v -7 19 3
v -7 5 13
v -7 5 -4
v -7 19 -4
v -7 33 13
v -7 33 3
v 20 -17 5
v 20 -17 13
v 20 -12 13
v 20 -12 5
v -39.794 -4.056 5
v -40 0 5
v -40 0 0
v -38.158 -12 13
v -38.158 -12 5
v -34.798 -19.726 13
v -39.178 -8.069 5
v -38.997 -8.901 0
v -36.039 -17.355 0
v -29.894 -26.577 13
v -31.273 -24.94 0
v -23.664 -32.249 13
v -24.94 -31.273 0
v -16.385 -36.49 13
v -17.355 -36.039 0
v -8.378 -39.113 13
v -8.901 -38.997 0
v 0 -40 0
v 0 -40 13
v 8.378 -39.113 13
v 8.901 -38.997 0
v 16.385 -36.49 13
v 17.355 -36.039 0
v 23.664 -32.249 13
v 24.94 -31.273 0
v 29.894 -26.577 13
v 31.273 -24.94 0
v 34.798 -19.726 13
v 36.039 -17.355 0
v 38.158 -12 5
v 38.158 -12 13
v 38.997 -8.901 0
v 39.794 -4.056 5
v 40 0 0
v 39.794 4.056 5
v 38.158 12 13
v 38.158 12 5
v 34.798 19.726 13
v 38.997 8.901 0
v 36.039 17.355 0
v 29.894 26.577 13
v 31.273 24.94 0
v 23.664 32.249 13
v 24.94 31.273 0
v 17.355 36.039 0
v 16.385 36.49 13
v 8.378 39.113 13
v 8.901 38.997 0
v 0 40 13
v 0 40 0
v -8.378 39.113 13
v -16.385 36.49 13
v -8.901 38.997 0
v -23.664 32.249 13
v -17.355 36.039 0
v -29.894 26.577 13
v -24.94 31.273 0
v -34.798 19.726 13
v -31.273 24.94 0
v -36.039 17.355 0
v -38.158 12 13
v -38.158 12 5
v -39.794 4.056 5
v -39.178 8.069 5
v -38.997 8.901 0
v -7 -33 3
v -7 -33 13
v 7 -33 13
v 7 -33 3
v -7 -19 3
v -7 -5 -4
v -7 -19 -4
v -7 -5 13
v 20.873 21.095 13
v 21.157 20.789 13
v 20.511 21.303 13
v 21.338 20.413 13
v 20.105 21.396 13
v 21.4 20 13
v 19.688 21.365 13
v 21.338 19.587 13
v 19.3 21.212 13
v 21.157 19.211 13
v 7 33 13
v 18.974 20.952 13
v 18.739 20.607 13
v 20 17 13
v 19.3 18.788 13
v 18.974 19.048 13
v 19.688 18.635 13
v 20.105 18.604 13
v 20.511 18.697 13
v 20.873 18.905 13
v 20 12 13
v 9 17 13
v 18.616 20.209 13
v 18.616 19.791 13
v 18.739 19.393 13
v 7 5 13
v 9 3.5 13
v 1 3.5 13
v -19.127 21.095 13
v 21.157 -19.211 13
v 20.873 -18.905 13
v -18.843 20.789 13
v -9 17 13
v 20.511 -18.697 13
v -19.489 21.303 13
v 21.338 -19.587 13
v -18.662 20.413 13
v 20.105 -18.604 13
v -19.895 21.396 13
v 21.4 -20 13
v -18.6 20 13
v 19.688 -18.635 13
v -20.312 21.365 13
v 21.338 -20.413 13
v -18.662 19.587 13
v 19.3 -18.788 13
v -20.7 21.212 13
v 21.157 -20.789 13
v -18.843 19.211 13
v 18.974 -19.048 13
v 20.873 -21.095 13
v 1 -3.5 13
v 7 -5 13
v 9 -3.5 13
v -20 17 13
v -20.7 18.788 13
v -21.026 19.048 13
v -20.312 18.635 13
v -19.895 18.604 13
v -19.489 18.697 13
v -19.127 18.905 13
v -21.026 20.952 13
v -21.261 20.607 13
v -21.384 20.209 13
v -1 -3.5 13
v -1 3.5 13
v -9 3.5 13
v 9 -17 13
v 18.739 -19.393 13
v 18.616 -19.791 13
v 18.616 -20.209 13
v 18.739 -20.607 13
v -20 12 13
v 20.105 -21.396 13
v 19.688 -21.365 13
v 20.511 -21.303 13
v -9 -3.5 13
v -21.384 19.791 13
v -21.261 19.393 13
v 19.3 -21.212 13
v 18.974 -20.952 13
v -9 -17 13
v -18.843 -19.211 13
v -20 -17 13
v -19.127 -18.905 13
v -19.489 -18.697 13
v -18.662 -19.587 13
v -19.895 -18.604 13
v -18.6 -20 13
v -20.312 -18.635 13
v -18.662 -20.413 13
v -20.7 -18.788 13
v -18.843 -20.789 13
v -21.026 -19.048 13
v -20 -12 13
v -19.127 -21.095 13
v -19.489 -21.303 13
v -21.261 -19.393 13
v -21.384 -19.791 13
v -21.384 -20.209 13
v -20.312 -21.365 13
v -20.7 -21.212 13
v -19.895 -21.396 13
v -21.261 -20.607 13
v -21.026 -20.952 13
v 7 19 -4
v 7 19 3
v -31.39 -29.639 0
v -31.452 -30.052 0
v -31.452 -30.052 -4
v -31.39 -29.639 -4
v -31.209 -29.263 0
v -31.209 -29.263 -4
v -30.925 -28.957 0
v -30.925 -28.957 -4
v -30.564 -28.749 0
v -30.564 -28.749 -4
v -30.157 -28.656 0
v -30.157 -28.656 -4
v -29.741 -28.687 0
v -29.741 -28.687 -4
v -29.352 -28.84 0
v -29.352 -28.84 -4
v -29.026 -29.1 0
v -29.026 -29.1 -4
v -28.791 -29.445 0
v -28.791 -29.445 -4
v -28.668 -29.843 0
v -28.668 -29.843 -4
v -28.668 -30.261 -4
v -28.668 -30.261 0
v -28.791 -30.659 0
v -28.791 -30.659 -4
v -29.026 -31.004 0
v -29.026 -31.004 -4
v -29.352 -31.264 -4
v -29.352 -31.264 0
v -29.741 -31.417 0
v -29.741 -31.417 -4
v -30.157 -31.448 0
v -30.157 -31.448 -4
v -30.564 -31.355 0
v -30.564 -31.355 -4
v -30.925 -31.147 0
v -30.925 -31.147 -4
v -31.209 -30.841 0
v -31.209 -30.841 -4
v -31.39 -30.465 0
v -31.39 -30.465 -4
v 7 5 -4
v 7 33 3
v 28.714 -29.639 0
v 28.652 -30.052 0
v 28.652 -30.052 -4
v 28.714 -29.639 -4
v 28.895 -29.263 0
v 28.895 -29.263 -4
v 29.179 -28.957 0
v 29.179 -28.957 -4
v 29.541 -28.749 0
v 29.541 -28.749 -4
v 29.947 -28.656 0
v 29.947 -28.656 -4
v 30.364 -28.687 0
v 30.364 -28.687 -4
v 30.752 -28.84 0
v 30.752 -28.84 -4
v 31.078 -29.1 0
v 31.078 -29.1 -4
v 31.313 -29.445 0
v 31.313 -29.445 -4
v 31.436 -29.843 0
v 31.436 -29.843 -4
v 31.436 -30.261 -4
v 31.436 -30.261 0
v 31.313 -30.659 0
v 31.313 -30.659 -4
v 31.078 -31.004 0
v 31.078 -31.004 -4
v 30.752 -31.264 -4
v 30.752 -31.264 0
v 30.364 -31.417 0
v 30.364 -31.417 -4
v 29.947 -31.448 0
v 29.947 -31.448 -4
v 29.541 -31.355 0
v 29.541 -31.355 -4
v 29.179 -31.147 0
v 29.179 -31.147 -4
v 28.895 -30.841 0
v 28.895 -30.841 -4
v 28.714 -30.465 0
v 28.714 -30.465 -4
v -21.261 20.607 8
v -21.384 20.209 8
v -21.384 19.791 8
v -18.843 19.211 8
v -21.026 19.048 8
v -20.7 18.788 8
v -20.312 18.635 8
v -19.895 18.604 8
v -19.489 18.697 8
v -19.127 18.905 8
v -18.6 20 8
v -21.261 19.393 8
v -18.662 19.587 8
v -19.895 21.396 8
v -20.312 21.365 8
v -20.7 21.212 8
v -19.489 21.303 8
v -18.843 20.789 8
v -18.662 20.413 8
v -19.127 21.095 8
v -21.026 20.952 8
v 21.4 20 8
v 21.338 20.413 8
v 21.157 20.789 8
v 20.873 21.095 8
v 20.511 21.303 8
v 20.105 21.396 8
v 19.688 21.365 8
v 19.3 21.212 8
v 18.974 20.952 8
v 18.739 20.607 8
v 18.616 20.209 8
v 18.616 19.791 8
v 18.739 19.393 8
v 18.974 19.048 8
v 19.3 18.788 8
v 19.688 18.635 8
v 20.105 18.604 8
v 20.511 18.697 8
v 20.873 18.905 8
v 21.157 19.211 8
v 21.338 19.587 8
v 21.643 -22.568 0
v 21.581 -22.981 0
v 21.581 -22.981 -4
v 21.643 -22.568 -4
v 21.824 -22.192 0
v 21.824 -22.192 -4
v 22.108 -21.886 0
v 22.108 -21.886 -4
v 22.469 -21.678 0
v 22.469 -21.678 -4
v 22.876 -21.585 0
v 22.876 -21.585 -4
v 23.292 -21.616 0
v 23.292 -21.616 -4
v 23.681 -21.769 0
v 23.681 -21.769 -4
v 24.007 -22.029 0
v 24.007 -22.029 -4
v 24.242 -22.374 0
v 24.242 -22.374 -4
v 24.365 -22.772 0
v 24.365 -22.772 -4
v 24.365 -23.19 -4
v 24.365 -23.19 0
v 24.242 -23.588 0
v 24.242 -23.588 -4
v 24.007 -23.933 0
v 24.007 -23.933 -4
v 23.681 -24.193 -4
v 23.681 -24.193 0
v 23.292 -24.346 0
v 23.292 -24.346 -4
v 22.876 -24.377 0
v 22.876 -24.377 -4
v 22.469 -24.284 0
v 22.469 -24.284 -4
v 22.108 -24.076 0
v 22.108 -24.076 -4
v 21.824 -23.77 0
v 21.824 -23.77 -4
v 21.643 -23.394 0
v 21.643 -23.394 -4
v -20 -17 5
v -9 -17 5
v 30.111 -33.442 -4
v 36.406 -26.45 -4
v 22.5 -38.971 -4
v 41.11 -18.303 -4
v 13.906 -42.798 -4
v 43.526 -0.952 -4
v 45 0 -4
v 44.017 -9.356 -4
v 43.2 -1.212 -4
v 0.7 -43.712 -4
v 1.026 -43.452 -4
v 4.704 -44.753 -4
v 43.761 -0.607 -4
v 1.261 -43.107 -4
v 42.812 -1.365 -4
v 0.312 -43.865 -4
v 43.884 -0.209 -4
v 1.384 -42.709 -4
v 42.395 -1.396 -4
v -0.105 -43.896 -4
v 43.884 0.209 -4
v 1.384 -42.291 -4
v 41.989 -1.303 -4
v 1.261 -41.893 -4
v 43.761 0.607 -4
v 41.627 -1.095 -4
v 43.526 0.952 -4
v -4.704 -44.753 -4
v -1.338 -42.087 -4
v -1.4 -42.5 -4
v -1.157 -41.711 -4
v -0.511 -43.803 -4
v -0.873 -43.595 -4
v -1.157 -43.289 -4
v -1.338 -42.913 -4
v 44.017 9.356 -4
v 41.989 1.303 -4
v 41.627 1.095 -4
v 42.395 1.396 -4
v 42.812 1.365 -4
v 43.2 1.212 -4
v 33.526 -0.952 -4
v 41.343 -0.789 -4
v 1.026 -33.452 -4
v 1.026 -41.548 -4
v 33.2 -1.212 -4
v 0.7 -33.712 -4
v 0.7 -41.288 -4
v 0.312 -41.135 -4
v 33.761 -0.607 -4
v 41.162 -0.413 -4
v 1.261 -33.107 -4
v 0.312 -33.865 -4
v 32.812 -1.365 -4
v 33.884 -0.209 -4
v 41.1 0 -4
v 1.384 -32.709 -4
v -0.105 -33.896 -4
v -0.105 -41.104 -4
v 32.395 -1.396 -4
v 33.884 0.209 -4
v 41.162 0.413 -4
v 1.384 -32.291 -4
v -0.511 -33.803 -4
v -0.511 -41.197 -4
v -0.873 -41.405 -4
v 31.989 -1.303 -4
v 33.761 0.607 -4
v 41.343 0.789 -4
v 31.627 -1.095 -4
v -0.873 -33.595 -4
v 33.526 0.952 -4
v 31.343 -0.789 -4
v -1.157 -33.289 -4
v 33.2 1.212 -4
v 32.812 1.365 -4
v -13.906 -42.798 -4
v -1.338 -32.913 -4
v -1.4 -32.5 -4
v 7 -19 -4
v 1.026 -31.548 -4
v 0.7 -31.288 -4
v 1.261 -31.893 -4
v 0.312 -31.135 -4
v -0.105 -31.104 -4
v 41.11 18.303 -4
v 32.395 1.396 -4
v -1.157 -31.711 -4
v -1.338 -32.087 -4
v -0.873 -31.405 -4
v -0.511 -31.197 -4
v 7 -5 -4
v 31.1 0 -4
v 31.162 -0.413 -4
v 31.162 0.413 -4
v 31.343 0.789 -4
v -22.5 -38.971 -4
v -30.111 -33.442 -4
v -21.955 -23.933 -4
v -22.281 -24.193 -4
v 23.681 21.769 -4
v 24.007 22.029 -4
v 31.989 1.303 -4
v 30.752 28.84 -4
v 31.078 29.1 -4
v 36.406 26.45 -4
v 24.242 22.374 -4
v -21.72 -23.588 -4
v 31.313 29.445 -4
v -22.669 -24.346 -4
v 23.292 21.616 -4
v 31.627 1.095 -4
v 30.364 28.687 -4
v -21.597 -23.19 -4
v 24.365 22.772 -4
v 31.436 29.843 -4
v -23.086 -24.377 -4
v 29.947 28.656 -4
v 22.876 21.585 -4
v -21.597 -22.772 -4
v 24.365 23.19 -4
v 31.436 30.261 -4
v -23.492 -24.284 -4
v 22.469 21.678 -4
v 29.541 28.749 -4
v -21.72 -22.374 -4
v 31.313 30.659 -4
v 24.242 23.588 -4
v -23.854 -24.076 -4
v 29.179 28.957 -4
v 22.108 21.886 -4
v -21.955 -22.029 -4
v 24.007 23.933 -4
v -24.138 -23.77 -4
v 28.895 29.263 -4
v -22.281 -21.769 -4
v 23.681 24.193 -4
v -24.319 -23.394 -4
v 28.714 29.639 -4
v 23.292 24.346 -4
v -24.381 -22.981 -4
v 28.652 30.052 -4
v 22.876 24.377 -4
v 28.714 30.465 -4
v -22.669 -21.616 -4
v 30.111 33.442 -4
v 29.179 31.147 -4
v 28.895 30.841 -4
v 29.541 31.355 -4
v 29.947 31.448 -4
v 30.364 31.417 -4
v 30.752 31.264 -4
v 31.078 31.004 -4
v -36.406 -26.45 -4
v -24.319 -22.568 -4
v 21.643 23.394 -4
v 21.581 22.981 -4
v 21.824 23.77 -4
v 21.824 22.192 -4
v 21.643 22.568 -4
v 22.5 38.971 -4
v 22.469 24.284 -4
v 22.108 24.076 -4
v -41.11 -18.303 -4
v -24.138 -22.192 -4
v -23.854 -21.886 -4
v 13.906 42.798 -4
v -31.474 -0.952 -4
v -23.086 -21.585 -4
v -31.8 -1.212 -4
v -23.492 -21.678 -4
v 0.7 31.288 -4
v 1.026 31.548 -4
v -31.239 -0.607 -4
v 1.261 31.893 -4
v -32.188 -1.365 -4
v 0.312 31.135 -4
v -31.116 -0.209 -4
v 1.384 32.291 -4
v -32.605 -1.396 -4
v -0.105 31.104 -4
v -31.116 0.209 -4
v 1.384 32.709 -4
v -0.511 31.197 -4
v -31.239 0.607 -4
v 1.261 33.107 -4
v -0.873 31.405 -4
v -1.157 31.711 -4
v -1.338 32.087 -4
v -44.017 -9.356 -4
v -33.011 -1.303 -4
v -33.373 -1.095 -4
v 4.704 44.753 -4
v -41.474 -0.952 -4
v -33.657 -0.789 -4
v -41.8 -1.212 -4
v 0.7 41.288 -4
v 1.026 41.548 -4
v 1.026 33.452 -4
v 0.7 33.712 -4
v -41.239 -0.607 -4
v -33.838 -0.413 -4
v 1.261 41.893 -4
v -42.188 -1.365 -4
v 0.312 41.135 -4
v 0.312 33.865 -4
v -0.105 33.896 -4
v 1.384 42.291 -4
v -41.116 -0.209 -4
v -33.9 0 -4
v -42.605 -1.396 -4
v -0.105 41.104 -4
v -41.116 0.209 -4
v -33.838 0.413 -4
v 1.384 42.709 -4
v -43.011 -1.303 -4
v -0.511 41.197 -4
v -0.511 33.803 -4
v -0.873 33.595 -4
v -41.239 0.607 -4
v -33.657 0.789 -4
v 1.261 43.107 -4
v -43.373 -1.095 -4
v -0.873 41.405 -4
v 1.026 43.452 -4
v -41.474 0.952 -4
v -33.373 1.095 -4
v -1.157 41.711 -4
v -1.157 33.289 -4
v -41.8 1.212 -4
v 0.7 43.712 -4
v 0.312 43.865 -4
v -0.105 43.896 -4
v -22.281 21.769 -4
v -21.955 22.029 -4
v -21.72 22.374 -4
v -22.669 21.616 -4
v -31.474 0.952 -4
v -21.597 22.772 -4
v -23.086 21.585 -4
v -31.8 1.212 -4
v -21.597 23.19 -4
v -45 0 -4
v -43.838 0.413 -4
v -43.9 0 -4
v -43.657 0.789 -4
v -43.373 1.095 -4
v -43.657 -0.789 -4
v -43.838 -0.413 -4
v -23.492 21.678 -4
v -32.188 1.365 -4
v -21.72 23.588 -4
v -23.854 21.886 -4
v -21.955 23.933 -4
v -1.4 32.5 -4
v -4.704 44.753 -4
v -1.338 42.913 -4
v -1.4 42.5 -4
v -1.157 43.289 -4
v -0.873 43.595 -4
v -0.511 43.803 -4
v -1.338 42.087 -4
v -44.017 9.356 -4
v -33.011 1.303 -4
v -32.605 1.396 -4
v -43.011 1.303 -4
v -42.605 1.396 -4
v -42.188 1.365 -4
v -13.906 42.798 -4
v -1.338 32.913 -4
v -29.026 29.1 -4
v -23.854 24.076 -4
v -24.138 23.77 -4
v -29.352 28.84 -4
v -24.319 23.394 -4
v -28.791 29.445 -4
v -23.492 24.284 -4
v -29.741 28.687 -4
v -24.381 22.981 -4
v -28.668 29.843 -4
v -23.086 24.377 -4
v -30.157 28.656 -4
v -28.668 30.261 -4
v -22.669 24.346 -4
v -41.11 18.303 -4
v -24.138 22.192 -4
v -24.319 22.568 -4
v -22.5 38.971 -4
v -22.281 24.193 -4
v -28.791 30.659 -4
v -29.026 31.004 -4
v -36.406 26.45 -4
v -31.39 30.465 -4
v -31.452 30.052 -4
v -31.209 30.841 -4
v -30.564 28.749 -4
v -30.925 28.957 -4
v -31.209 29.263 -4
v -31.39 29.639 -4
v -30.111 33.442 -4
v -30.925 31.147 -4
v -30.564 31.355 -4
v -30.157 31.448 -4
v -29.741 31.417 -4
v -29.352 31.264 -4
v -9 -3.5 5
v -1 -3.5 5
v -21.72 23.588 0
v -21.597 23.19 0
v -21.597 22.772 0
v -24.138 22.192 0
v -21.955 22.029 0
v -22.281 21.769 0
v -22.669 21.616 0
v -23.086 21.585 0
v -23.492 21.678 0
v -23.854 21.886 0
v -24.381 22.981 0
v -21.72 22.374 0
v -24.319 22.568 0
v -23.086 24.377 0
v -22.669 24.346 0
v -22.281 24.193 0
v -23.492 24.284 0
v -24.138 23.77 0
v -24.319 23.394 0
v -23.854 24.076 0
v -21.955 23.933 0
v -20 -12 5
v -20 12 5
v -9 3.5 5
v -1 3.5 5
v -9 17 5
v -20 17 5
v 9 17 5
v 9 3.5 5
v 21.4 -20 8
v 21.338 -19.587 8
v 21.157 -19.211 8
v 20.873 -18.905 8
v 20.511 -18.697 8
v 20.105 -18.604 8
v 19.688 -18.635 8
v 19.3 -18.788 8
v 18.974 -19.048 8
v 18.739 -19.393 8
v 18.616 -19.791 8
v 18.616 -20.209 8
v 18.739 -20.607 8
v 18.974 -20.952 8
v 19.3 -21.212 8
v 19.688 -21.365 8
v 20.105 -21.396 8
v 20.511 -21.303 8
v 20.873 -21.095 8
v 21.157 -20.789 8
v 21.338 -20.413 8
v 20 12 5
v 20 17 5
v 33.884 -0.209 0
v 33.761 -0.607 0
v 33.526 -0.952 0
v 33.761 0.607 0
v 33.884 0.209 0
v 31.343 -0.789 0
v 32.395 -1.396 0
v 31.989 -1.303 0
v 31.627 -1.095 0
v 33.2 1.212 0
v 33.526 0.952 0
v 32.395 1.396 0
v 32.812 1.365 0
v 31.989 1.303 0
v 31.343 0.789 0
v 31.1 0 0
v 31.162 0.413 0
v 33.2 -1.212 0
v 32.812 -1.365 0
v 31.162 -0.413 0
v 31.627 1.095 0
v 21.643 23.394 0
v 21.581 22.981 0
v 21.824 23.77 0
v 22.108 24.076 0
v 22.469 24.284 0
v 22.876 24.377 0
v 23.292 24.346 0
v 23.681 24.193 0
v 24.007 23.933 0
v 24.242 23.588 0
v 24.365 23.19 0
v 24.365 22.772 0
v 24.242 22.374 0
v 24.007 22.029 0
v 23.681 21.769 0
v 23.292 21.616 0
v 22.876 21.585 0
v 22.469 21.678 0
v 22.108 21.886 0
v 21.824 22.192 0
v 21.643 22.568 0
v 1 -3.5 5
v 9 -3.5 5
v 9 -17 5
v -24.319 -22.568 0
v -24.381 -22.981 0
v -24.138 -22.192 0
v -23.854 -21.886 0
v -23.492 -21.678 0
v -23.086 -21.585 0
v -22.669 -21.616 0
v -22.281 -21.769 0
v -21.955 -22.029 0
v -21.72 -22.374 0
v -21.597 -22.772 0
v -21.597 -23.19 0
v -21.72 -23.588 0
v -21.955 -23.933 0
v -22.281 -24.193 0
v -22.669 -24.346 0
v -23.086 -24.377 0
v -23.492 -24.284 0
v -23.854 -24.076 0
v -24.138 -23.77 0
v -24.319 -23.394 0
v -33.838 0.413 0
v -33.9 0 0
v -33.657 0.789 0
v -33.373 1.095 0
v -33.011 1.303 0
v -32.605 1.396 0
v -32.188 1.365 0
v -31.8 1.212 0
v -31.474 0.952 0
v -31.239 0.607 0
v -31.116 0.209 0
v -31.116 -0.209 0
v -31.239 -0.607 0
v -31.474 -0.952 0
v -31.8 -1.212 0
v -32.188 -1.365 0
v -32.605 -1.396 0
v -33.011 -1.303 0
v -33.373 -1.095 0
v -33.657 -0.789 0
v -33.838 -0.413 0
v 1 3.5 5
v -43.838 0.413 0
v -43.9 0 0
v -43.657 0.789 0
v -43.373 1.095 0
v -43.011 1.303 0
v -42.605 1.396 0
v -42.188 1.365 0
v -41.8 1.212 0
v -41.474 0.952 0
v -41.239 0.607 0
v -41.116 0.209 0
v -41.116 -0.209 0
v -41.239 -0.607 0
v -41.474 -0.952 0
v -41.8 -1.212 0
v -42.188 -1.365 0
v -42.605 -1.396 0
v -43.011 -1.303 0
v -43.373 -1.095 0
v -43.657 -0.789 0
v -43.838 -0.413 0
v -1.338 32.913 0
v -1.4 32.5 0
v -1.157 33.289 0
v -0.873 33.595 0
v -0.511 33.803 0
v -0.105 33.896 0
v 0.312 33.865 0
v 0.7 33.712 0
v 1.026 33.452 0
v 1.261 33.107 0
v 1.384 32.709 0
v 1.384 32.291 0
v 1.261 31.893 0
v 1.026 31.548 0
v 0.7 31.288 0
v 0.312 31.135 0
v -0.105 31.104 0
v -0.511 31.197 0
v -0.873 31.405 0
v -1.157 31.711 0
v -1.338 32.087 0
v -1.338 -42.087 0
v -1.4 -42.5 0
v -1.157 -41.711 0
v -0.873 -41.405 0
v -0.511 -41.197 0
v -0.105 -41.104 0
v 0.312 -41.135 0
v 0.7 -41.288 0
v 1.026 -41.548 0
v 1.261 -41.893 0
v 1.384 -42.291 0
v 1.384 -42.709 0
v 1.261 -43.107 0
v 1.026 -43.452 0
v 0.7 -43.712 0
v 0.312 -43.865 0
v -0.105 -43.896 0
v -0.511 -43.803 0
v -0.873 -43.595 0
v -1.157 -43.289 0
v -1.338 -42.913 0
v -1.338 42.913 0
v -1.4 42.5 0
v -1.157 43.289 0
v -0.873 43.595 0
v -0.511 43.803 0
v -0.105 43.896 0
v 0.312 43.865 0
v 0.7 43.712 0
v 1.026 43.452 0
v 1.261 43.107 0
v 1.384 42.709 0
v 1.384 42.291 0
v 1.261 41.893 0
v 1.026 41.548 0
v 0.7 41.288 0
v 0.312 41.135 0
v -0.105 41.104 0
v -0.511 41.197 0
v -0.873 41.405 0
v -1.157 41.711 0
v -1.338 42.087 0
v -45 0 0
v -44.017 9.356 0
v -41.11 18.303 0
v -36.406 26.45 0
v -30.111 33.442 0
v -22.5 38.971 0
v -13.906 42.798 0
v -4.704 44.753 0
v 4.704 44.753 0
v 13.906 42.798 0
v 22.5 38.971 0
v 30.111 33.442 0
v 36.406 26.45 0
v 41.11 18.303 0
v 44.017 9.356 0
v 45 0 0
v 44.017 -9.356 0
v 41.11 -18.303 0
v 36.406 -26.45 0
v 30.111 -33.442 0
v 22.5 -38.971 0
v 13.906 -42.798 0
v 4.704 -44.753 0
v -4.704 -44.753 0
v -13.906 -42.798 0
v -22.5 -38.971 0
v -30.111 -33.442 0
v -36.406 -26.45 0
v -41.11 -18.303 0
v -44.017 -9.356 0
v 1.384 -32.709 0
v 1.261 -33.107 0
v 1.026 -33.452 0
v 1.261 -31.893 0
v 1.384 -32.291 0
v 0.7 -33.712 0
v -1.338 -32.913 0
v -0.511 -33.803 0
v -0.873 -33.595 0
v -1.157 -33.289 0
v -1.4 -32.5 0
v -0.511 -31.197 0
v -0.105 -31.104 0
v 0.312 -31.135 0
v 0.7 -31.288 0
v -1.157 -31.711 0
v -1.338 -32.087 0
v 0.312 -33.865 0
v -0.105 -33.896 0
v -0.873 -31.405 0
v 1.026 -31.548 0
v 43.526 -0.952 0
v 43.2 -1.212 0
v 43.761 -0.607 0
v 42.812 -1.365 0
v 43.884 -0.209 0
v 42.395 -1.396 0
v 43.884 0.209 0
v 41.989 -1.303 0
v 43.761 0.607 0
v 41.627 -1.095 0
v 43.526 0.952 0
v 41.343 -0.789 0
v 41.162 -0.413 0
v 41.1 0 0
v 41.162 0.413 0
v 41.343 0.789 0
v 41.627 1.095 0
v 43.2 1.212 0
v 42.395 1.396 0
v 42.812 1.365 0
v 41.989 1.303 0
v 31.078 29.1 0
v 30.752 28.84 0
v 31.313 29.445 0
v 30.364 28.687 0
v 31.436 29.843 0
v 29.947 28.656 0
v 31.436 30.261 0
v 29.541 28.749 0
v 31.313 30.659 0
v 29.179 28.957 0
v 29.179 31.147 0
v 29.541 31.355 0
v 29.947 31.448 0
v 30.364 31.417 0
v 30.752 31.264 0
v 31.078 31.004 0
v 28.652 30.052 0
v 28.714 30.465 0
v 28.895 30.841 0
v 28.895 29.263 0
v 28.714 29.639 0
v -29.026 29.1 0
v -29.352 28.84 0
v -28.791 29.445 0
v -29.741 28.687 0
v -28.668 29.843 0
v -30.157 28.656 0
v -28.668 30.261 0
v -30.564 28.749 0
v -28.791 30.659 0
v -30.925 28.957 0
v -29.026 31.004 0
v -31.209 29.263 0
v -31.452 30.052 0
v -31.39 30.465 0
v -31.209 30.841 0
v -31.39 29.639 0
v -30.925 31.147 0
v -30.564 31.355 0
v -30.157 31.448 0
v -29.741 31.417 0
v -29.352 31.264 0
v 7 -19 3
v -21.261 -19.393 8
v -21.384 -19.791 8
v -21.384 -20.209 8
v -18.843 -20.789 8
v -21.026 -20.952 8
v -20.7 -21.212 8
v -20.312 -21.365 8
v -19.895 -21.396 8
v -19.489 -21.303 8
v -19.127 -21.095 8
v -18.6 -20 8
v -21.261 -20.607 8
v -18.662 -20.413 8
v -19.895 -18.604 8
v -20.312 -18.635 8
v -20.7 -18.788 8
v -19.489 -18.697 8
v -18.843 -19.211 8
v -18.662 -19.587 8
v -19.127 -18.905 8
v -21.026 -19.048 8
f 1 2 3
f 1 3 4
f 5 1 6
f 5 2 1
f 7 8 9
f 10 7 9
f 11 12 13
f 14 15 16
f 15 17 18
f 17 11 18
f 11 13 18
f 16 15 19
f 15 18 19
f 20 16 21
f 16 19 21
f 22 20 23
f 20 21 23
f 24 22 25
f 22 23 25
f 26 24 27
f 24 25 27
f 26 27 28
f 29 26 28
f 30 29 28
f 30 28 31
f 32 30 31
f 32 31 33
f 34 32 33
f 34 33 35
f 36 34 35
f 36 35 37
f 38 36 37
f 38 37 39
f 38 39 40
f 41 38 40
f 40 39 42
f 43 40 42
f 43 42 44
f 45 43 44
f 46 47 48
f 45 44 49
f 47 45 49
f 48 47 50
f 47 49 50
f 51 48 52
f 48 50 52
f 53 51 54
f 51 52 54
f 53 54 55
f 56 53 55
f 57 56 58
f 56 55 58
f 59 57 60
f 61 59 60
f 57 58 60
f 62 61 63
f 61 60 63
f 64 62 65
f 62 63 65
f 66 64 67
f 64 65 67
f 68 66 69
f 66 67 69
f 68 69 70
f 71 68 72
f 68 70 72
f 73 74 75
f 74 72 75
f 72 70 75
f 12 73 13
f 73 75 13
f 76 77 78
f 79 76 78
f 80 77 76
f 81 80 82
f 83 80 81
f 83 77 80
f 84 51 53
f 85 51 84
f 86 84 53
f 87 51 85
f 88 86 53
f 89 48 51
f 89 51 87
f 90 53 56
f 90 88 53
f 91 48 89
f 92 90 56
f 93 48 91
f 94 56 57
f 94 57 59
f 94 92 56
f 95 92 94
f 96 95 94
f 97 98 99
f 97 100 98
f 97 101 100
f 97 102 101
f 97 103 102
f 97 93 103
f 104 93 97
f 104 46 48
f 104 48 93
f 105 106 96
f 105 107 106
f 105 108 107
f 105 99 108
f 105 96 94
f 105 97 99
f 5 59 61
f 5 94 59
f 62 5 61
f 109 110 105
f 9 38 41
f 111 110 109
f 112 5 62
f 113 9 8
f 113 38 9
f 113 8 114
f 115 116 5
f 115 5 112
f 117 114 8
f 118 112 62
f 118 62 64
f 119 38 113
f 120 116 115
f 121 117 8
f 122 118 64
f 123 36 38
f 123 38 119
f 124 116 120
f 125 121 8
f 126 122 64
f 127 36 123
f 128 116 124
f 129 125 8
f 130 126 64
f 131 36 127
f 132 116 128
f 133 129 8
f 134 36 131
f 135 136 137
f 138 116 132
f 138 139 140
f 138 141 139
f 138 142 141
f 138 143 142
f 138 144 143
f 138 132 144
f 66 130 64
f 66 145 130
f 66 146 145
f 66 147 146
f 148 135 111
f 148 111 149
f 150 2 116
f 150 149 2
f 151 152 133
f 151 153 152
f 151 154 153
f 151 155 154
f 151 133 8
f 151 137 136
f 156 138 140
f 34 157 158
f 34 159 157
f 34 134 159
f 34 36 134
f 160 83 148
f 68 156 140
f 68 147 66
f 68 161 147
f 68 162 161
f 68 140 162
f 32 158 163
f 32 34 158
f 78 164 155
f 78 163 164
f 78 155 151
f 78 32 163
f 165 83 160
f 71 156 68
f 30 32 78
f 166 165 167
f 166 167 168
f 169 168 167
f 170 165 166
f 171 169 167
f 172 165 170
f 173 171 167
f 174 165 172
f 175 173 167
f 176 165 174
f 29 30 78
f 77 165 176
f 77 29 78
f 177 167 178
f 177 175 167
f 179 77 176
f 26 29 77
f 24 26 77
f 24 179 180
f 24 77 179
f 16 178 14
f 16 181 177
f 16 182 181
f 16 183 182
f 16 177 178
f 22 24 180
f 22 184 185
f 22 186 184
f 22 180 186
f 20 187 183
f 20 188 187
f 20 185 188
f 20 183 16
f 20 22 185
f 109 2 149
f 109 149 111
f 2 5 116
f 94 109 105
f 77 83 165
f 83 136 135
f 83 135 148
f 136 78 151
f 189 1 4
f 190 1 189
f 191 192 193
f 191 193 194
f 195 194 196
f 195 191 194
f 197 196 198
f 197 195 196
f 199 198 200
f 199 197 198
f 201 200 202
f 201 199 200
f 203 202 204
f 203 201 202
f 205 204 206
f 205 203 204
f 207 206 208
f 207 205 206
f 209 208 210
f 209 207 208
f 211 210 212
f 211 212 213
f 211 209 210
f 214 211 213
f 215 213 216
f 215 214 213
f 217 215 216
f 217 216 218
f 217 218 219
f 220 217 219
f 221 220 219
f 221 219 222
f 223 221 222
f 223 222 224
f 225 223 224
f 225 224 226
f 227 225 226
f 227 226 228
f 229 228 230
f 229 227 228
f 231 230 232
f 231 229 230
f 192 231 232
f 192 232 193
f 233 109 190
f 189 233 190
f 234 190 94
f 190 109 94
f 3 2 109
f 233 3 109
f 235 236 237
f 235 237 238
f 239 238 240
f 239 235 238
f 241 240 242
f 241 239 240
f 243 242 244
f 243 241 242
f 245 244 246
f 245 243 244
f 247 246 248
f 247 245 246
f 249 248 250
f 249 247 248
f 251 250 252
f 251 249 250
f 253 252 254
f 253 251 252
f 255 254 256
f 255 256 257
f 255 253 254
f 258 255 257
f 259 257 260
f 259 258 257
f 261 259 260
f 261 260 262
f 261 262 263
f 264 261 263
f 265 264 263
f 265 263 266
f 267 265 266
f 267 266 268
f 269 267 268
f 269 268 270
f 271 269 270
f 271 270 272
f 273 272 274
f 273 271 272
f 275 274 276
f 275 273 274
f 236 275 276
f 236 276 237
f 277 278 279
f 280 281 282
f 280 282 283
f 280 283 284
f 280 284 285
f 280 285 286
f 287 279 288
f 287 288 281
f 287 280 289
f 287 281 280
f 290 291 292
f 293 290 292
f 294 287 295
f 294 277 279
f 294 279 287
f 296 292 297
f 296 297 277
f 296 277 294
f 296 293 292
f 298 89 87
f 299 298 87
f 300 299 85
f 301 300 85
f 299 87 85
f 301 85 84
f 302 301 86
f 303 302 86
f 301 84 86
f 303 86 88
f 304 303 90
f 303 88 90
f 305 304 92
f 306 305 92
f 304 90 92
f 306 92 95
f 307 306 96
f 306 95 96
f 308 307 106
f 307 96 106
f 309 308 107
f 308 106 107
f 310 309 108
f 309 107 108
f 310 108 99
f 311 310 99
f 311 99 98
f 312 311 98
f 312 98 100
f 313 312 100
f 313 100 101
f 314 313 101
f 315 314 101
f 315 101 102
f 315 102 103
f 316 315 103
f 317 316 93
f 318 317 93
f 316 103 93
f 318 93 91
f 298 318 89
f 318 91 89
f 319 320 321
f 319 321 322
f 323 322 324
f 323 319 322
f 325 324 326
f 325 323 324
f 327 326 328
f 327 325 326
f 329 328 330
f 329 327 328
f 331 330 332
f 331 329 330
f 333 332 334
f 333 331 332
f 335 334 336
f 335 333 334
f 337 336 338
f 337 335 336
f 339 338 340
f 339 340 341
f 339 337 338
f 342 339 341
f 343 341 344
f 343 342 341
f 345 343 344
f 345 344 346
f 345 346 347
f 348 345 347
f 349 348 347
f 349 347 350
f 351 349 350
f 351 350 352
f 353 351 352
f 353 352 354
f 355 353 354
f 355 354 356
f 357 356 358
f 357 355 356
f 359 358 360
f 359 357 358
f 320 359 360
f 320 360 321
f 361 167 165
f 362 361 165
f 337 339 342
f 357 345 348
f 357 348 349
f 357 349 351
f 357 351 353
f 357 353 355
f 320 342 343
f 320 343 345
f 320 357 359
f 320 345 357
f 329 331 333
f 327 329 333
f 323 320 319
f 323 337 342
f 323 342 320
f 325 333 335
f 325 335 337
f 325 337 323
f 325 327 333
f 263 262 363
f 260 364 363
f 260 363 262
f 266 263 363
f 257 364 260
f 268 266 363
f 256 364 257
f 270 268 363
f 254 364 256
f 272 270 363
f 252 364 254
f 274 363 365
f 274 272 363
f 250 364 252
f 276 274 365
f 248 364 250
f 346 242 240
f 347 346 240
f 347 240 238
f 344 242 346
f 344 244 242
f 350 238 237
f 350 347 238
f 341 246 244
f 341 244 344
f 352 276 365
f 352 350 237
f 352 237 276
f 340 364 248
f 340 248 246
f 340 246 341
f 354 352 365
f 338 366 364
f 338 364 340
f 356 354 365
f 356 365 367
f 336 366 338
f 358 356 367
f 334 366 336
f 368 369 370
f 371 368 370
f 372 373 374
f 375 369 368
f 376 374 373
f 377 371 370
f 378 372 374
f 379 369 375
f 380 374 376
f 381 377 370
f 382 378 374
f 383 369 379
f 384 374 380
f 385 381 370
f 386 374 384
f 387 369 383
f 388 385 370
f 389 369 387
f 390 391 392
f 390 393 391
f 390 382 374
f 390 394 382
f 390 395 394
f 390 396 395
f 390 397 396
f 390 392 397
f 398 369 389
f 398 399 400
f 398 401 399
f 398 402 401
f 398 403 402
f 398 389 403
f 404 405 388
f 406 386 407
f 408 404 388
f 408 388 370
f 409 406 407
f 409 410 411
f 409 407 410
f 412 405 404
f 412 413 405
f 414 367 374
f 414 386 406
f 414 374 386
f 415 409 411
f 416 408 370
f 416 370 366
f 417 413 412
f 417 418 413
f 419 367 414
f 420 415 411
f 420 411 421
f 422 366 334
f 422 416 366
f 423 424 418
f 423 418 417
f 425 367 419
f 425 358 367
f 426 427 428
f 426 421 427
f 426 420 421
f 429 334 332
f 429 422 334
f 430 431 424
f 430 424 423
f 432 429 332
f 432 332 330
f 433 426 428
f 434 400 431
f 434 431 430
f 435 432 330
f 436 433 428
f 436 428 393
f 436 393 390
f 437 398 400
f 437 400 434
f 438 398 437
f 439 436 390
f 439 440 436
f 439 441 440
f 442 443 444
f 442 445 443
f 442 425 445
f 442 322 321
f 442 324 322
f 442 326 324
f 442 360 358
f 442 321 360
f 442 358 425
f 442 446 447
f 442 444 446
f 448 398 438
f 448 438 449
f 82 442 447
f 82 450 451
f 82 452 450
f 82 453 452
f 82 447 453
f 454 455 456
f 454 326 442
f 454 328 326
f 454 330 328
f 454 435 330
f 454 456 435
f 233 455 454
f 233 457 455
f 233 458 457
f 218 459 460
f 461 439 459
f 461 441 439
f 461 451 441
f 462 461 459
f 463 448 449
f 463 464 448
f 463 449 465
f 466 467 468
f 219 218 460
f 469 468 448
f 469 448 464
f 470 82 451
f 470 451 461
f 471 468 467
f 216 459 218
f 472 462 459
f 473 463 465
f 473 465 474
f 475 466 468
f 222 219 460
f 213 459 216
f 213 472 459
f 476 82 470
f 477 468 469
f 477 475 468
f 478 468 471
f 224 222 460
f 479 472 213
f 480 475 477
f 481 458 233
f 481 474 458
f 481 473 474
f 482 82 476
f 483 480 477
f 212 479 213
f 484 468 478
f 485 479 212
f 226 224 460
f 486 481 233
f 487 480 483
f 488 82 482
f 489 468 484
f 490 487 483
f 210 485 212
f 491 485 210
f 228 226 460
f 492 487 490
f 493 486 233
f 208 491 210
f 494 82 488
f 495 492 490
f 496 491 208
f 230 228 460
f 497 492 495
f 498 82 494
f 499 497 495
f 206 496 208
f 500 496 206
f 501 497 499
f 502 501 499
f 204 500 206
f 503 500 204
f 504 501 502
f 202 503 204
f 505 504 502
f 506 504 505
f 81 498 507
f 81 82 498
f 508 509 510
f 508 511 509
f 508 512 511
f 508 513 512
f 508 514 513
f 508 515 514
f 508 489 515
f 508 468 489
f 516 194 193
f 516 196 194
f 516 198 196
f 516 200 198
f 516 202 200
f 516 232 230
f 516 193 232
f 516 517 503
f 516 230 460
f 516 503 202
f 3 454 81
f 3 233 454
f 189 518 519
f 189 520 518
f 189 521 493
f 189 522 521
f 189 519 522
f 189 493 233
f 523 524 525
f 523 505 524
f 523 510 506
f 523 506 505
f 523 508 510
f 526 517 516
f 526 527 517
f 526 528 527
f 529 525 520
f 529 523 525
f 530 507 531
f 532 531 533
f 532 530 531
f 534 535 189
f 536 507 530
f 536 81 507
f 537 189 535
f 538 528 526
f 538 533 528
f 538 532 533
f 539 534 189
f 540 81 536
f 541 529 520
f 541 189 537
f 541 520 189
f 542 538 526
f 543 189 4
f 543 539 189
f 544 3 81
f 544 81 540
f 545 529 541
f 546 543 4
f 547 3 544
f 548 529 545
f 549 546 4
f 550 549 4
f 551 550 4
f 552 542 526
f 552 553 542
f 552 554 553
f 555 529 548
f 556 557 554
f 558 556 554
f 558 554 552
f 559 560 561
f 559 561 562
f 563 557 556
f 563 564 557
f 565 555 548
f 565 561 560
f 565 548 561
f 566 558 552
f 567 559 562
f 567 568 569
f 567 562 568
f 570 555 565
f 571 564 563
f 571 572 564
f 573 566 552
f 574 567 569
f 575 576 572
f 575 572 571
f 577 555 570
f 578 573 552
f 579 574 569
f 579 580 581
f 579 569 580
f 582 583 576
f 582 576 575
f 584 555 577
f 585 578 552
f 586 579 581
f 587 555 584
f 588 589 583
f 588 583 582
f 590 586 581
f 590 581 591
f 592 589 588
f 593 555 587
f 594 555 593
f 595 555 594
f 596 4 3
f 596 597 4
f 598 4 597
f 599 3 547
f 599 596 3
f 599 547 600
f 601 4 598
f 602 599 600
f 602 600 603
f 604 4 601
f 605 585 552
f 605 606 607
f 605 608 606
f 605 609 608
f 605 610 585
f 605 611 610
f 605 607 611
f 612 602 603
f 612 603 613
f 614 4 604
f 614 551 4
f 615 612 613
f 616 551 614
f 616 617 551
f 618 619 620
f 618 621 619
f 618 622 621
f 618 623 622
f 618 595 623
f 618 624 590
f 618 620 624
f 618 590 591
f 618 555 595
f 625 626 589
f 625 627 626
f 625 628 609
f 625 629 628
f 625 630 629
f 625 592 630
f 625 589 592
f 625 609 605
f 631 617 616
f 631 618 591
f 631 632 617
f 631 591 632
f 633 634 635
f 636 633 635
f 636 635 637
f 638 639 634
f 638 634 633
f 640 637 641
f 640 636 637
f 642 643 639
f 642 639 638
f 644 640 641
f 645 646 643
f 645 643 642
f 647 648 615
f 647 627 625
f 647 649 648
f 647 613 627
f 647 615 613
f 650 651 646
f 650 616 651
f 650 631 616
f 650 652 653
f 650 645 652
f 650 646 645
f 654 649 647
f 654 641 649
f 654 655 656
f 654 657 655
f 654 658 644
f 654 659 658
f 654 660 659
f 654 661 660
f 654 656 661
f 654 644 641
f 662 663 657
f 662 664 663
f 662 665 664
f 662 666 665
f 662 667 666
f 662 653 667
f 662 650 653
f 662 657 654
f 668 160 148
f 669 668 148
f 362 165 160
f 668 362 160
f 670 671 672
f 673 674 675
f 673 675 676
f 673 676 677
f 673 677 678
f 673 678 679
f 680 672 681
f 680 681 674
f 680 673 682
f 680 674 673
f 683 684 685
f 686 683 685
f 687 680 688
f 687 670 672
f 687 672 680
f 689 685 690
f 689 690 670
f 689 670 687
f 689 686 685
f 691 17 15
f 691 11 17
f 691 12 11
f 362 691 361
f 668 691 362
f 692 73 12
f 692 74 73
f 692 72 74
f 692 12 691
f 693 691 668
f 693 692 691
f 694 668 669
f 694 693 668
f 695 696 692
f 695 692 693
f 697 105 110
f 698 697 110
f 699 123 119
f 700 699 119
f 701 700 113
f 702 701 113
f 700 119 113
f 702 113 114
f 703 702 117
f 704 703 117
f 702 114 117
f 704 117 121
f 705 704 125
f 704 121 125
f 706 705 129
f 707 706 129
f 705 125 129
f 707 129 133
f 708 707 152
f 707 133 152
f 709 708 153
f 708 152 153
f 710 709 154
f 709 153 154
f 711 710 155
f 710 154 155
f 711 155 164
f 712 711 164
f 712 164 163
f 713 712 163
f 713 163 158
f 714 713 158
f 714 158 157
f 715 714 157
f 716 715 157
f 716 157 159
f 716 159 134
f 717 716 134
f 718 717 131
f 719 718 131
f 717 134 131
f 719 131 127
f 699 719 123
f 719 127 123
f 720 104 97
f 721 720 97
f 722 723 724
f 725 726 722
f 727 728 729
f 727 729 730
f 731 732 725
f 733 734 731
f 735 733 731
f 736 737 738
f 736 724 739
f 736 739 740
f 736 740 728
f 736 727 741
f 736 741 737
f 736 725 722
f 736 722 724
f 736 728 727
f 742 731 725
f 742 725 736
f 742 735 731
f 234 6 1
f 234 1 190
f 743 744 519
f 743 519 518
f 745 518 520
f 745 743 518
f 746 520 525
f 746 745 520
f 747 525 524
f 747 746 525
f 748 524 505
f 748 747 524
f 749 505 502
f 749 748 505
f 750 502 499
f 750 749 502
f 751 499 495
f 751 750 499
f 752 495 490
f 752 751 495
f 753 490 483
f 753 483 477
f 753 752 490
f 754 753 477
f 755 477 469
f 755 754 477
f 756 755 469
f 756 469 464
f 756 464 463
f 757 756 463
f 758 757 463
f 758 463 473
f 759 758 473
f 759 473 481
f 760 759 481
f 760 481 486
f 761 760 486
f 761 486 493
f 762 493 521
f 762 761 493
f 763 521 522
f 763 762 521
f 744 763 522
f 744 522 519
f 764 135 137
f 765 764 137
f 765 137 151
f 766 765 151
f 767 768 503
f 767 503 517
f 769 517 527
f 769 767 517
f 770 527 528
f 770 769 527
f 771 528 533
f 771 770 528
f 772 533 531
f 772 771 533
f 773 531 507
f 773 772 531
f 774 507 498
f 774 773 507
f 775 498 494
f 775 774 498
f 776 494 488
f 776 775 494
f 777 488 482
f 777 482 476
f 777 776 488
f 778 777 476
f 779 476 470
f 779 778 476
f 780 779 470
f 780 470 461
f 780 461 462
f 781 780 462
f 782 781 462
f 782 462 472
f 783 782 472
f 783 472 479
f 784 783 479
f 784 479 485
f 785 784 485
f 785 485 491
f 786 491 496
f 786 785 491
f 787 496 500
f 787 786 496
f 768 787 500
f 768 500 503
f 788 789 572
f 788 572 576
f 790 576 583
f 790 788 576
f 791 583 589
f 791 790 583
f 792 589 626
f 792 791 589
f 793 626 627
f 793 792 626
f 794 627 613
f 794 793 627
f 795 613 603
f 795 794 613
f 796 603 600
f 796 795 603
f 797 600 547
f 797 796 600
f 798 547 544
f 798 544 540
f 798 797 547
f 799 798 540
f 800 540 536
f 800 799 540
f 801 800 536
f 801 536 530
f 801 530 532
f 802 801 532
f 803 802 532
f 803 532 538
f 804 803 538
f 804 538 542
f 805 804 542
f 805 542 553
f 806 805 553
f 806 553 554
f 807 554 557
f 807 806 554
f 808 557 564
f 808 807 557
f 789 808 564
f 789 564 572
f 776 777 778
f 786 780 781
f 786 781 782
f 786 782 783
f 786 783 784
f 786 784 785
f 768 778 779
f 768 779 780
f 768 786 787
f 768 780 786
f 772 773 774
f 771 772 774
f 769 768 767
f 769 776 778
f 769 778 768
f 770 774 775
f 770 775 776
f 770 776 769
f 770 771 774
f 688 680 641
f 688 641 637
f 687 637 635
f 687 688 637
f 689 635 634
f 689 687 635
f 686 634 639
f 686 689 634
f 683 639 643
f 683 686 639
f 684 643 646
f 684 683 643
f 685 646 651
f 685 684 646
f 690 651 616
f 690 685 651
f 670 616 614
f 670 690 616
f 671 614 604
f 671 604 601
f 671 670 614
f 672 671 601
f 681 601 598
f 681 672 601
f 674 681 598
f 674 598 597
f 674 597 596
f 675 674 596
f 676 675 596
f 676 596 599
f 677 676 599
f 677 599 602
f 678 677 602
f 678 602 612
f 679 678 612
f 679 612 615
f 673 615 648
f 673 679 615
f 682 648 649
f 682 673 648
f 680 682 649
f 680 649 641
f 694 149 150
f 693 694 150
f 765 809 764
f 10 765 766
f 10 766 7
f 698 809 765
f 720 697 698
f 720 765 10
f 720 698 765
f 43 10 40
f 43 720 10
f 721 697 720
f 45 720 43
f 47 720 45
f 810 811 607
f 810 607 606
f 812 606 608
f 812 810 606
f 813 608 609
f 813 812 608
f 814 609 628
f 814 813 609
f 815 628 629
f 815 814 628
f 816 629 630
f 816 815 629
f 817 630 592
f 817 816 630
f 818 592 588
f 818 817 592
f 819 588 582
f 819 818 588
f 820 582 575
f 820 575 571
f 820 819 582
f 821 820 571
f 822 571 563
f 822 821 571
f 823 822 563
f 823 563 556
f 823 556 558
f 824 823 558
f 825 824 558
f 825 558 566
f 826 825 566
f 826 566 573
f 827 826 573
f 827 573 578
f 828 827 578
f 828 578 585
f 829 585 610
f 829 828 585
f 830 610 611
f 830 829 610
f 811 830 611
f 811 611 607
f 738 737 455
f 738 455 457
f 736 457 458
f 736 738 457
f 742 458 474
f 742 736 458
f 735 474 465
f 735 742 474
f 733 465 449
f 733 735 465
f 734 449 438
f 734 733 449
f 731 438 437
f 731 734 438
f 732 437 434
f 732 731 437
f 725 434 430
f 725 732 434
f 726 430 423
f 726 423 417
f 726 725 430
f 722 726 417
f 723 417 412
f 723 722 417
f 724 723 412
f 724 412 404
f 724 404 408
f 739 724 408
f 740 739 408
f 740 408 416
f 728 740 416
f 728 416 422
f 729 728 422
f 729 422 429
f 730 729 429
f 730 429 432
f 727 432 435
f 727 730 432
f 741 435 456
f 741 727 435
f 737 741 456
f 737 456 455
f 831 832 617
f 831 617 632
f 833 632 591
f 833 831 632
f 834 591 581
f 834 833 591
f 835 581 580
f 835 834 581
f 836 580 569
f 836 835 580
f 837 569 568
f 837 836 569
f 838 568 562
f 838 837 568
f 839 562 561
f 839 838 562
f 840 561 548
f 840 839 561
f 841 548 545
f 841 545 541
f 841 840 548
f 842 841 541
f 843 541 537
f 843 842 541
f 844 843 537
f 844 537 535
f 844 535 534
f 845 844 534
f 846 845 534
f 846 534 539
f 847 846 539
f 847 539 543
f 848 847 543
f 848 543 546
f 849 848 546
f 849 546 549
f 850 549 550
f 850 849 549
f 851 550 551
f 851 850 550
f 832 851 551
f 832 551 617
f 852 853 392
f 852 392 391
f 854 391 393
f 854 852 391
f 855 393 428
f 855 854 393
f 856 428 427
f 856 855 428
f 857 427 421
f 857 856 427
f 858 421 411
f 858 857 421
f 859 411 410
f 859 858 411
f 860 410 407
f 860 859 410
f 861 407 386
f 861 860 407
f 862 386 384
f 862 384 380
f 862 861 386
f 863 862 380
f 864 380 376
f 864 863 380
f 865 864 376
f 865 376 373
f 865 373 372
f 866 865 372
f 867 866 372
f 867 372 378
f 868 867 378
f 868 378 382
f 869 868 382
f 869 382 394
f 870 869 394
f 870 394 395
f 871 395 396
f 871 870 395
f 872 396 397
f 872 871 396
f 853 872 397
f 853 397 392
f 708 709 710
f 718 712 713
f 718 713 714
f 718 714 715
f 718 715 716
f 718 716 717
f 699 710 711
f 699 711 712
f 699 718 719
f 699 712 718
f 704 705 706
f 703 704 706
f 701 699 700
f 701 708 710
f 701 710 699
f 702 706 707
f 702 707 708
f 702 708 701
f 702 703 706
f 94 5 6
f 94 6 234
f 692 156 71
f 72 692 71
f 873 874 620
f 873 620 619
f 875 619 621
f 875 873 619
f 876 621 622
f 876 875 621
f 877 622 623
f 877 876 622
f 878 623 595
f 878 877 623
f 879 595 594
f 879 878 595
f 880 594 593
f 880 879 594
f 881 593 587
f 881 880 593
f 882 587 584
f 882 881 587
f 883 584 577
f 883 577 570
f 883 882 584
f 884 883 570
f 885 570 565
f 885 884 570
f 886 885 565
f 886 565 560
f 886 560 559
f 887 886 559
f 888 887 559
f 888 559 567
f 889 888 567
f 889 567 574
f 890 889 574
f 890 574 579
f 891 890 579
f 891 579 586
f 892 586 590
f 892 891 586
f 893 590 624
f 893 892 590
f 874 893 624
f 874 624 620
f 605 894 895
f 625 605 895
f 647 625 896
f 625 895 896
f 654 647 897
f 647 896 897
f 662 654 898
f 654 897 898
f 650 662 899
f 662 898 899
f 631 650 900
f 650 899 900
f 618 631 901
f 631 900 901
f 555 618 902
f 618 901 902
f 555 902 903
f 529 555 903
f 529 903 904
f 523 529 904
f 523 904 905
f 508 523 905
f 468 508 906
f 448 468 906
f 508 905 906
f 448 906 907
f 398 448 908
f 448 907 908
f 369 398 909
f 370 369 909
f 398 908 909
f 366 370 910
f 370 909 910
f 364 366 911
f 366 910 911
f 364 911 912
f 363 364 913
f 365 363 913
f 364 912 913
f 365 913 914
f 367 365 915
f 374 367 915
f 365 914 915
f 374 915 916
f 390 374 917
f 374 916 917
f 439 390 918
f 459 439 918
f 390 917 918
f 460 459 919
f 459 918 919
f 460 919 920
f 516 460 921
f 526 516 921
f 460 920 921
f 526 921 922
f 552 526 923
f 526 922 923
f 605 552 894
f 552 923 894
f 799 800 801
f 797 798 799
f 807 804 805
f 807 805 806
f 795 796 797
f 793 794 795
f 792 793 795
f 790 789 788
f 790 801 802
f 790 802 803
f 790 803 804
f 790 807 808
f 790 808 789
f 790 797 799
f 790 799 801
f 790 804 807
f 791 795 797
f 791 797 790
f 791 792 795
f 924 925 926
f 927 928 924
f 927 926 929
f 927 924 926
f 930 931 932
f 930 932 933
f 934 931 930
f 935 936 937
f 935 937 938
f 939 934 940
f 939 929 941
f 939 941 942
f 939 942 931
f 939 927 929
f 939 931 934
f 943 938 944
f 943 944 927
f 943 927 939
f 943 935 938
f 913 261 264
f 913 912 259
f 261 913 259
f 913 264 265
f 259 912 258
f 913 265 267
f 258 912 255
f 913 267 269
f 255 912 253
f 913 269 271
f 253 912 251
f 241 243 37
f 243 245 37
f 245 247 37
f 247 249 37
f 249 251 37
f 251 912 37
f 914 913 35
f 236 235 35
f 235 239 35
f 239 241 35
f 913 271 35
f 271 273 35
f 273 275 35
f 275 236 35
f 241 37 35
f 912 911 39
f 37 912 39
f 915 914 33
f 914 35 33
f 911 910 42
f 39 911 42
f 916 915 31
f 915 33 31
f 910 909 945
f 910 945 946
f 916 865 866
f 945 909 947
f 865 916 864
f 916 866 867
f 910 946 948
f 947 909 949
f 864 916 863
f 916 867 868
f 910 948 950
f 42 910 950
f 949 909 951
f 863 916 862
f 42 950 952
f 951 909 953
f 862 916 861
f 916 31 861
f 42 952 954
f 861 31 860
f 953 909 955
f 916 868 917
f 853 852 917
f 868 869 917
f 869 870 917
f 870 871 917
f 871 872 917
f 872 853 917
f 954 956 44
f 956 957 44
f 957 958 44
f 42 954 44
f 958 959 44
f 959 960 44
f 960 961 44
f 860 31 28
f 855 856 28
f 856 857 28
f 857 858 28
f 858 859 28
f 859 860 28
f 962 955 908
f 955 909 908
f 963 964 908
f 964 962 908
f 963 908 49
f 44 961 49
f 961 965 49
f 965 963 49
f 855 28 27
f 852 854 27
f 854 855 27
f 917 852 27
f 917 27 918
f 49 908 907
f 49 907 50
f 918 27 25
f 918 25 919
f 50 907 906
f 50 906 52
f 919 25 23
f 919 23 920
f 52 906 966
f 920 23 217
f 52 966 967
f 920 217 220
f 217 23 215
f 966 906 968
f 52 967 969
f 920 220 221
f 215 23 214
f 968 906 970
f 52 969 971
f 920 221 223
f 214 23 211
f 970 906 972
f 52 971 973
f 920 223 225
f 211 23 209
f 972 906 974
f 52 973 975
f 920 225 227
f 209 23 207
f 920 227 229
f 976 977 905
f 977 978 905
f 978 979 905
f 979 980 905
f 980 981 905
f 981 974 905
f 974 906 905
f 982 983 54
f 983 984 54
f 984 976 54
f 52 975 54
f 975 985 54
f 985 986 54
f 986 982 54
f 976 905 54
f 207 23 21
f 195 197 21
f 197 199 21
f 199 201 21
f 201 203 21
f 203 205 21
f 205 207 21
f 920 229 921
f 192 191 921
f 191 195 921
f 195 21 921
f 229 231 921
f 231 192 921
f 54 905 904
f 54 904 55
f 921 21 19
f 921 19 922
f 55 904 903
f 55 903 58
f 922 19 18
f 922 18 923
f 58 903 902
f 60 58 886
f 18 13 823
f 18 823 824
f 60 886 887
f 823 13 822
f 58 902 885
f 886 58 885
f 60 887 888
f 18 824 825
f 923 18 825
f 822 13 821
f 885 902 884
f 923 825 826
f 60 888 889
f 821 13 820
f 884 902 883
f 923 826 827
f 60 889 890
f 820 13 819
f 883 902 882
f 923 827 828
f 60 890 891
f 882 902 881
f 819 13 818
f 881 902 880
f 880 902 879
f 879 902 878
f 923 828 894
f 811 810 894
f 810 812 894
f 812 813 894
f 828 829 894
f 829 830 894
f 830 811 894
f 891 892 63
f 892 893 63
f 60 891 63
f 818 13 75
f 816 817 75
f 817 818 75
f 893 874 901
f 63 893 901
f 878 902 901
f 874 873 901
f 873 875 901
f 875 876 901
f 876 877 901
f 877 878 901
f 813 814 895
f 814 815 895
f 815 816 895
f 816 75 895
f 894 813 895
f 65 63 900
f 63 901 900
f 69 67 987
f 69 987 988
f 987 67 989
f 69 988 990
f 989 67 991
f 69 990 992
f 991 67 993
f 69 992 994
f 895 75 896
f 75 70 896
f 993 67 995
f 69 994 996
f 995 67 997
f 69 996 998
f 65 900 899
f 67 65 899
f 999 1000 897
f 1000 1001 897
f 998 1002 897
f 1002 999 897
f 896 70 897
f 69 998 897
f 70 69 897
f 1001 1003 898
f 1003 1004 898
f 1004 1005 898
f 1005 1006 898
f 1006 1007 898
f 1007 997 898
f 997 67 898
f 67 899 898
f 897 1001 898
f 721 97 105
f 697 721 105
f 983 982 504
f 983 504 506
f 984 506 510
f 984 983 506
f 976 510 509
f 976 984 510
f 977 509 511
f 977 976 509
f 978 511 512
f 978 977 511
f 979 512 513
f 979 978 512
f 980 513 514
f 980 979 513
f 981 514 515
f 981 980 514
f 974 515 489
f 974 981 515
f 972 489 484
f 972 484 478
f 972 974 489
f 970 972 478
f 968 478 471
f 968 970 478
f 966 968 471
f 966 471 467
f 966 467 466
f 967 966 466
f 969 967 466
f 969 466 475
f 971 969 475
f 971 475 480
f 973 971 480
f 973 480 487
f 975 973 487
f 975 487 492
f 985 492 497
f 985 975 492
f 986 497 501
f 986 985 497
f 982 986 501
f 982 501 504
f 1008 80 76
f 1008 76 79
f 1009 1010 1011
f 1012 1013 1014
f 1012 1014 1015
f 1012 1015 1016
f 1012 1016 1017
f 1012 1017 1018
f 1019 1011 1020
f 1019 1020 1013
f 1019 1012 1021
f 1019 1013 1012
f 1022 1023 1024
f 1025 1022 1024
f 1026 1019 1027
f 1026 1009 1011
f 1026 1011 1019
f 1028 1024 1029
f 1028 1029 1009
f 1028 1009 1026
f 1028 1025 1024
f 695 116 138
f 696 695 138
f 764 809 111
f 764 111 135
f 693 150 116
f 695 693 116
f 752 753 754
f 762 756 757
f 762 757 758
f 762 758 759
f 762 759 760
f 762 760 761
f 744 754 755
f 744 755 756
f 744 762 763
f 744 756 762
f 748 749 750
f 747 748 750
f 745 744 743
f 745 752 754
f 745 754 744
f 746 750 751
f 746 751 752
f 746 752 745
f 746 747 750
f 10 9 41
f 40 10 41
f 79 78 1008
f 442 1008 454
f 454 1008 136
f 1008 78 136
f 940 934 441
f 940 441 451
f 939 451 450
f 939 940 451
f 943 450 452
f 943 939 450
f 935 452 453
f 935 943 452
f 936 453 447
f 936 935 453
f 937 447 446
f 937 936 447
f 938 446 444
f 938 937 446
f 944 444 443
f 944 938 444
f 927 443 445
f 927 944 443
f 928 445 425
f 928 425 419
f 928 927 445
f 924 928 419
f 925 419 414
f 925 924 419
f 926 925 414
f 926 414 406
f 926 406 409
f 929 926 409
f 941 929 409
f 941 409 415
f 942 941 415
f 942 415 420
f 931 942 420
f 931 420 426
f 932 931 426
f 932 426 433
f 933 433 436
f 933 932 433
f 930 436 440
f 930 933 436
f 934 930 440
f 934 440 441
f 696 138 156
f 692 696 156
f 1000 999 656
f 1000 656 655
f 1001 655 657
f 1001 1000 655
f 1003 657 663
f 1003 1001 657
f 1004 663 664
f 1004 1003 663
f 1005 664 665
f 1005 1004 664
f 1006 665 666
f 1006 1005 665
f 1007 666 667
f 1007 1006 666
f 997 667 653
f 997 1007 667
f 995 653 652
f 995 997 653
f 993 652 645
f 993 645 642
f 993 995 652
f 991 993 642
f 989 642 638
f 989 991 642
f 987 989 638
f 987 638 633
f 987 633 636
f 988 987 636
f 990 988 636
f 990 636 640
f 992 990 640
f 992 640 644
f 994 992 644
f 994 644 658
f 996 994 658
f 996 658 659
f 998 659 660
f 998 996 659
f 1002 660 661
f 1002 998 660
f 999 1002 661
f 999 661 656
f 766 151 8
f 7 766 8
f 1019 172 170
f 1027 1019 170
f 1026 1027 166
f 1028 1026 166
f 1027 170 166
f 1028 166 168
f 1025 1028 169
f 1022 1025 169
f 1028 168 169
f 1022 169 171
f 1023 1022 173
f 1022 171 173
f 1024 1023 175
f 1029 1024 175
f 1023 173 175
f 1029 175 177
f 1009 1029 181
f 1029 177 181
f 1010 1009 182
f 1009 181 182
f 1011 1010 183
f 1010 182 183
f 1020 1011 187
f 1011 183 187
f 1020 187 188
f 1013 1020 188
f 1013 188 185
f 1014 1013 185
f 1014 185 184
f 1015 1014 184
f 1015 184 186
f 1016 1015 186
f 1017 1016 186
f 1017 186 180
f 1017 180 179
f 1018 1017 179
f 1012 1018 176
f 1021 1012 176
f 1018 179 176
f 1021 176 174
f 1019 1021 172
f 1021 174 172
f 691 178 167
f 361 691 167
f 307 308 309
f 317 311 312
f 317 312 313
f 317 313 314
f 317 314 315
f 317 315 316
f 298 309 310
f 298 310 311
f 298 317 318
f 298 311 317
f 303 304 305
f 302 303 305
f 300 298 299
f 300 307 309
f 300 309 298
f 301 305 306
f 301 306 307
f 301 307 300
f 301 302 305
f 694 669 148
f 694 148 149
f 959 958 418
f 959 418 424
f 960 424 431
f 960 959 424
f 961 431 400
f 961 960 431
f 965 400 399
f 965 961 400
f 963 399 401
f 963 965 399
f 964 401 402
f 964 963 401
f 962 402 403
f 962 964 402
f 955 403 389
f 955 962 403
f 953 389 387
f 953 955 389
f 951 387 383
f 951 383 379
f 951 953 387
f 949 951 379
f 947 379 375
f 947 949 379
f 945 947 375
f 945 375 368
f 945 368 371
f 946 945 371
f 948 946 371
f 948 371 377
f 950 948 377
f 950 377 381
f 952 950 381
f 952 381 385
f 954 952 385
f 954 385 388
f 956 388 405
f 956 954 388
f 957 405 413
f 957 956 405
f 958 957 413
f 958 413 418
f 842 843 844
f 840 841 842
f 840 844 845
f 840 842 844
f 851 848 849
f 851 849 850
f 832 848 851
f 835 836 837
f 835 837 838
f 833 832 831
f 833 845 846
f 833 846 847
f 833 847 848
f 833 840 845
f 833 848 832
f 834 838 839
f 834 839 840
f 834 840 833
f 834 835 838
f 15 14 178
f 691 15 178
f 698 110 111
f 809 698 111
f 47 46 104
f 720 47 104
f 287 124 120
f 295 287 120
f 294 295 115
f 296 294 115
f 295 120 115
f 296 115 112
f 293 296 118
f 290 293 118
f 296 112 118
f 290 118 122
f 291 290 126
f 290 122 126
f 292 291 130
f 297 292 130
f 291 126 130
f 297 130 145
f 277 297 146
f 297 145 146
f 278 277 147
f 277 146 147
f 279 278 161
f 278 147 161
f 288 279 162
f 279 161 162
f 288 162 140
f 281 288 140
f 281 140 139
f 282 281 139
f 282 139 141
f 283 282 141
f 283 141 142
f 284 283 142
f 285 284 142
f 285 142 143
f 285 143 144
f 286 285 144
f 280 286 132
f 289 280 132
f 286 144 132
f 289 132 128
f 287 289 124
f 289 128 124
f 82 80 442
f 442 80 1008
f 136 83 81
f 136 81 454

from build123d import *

# Parameters (mm, degrees)
SKETCH1_R           = 40
BOSS_EXTRUDE1_DEPTH = 13
CUT_EXTRUDE1_DEPTH  = 8
SKETCH2_4_R         = 1.4
CUT_EXTRUDE2_DEPTH  = 5
SKETCH3_W           = 14
SKETCH3_H           = 28
CUT_EXTRUDE6_DEPTH  = 10
SKETCH5_R           = 45
BOSS_EXTRUDE2_DEPTH = 4
SKETCH6_R           = 1.4
CUT_EXTRUDE8_DEPTH  = 4
SKETCH6_3_R         = 1.4
CUT_EXTRUDE9_DEPTH  = 4
SKETCH7_W           = 14
SKETCH7_H           = 14
CUT_EXTRUDE10_DEPTH = 17


with BuildPart() as part:
    # Sketch1 → Boss-Extrude1 (new body)
    with BuildSketch(Plane.XY):
        Circle(SKETCH1_R)
    extrude(amount=BOSS_EXTRUDE1_DEPTH)

    # Sketch2 → Cut-Extrude1 (cut)
    with BuildSketch(Plane.XY.offset(13)):
        Polygon((-40, 12), (-40, -12), (-20, -12), (-20, -17), (-9, -17), (-9, -3.5), (-1, -3.5), (-1, 3.5), (-9, 3.5), (-9, 17), (-20, 17), (-20, 12), align=None)
        Polygon((1, 3.5), (1, -3.5), (9, -3.5), (9, -17), (20, -17), (20, -12), (40, -12), (40, 12), (20, 12), (20, 17), (9, 17), (9, 3.5), align=None)
    extrude(amount=-CUT_EXTRUDE1_DEPTH, mode=Mode.SUBTRACT)

    # Sketch2<4> → Cut-Extrude2 (cut)
    with BuildSketch(Plane.XY.offset(13)):
        with Locations((-20, 20)):
            Circle(SKETCH2_4_R)
        with Locations((20, 20)):
            Circle(SKETCH2_4_R)
        with Locations((-20, -20)):
            Circle(SKETCH2_4_R)
        with Locations((20, -20)):
            Circle(SKETCH2_4_R)
    extrude(amount=-CUT_EXTRUDE2_DEPTH, mode=Mode.SUBTRACT)

    # Sketch3 → Cut-Extrude6 (cut)
    with BuildSketch(Plane.XY.offset(13)):
        with Locations((0, 19)):
            Rectangle(SKETCH3_W, SKETCH3_H)
        with Locations((0, -19)):
            Rectangle(SKETCH3_W, SKETCH3_H)
    extrude(amount=-CUT_EXTRUDE6_DEPTH, mode=Mode.SUBTRACT)

    # Sketch5 → Boss-Extrude2 (add)
    with BuildSketch(Plane(origin=(0, 0, 0), x_dir=(-1, 0, 0), z_dir=(0, 0, -1))):
        Circle(SKETCH5_R)
    extrude(amount=BOSS_EXTRUDE2_DEPTH)

    # Sketch6 → Cut-Extrude8 (cut)
    with BuildSketch(Plane(origin=(0, 0, 0), x_dir=(-1, 0, 0), z_dir=(0, 0, -1))):
        with Locations((0, 42.5)):
            Circle(SKETCH6_R)
        with Locations((30.0520382, 30.0520382)):
            Circle(SKETCH6_R)
        with Locations((42.5, 0)):
            Circle(SKETCH6_R)
        with Locations((30.0520382, -30.0520382)):
            Circle(SKETCH6_R)
        with Locations((0, -42.5)):
            Circle(SKETCH6_R)
        with Locations((-30.0520382, -30.0520382)):
            Circle(SKETCH6_R)
        with Locations((-42.5, 0)):
            Circle(SKETCH6_R)
        with Locations((-30.0520382, 30.0520382)):
            Circle(SKETCH6_R)
    extrude(amount=CUT_EXTRUDE8_DEPTH, mode=Mode.SUBTRACT)

    # Sketch6<3> → Cut-Extrude9 (cut)
    with BuildSketch(Plane(origin=(0, 0, 0), x_dir=(-1, 0, 0), z_dir=(0, 0, -1))):
        with Locations((0, 32.5)):
            Circle(SKETCH6_3_R)
        with Locations((22.980970389, 22.980970389)):
            Circle(SKETCH6_3_R)
        with Locations((32.5, 0)):
            Circle(SKETCH6_3_R)
        with Locations((22.980970389, -22.980970389)):
            Circle(SKETCH6_3_R)
        with Locations((0, -32.5)):
            Circle(SKETCH6_3_R)
        with Locations((-22.980970389, -22.980970389)):
            Circle(SKETCH6_3_R)
        with Locations((-32.5, 0)):
            Circle(SKETCH6_3_R)
        with Locations((-22.980970389, 22.980970389)):
            Circle(SKETCH6_3_R)
    extrude(amount=CUT_EXTRUDE9_DEPTH, mode=Mode.SUBTRACT)

    # Sketch7 → Cut-Extrude10 (cut)
    with BuildSketch(Plane.XY.offset(13)):
        with Locations((0, 12)):
            Rectangle(SKETCH7_W, SKETCH7_H)
        with Locations((0, -12)):
            Rectangle(SKETCH7_W, SKETCH7_H)
    extrude(amount=-CUT_EXTRUDE10_DEPTH, mode=Mode.SUBTRACT)


solid = part.part
